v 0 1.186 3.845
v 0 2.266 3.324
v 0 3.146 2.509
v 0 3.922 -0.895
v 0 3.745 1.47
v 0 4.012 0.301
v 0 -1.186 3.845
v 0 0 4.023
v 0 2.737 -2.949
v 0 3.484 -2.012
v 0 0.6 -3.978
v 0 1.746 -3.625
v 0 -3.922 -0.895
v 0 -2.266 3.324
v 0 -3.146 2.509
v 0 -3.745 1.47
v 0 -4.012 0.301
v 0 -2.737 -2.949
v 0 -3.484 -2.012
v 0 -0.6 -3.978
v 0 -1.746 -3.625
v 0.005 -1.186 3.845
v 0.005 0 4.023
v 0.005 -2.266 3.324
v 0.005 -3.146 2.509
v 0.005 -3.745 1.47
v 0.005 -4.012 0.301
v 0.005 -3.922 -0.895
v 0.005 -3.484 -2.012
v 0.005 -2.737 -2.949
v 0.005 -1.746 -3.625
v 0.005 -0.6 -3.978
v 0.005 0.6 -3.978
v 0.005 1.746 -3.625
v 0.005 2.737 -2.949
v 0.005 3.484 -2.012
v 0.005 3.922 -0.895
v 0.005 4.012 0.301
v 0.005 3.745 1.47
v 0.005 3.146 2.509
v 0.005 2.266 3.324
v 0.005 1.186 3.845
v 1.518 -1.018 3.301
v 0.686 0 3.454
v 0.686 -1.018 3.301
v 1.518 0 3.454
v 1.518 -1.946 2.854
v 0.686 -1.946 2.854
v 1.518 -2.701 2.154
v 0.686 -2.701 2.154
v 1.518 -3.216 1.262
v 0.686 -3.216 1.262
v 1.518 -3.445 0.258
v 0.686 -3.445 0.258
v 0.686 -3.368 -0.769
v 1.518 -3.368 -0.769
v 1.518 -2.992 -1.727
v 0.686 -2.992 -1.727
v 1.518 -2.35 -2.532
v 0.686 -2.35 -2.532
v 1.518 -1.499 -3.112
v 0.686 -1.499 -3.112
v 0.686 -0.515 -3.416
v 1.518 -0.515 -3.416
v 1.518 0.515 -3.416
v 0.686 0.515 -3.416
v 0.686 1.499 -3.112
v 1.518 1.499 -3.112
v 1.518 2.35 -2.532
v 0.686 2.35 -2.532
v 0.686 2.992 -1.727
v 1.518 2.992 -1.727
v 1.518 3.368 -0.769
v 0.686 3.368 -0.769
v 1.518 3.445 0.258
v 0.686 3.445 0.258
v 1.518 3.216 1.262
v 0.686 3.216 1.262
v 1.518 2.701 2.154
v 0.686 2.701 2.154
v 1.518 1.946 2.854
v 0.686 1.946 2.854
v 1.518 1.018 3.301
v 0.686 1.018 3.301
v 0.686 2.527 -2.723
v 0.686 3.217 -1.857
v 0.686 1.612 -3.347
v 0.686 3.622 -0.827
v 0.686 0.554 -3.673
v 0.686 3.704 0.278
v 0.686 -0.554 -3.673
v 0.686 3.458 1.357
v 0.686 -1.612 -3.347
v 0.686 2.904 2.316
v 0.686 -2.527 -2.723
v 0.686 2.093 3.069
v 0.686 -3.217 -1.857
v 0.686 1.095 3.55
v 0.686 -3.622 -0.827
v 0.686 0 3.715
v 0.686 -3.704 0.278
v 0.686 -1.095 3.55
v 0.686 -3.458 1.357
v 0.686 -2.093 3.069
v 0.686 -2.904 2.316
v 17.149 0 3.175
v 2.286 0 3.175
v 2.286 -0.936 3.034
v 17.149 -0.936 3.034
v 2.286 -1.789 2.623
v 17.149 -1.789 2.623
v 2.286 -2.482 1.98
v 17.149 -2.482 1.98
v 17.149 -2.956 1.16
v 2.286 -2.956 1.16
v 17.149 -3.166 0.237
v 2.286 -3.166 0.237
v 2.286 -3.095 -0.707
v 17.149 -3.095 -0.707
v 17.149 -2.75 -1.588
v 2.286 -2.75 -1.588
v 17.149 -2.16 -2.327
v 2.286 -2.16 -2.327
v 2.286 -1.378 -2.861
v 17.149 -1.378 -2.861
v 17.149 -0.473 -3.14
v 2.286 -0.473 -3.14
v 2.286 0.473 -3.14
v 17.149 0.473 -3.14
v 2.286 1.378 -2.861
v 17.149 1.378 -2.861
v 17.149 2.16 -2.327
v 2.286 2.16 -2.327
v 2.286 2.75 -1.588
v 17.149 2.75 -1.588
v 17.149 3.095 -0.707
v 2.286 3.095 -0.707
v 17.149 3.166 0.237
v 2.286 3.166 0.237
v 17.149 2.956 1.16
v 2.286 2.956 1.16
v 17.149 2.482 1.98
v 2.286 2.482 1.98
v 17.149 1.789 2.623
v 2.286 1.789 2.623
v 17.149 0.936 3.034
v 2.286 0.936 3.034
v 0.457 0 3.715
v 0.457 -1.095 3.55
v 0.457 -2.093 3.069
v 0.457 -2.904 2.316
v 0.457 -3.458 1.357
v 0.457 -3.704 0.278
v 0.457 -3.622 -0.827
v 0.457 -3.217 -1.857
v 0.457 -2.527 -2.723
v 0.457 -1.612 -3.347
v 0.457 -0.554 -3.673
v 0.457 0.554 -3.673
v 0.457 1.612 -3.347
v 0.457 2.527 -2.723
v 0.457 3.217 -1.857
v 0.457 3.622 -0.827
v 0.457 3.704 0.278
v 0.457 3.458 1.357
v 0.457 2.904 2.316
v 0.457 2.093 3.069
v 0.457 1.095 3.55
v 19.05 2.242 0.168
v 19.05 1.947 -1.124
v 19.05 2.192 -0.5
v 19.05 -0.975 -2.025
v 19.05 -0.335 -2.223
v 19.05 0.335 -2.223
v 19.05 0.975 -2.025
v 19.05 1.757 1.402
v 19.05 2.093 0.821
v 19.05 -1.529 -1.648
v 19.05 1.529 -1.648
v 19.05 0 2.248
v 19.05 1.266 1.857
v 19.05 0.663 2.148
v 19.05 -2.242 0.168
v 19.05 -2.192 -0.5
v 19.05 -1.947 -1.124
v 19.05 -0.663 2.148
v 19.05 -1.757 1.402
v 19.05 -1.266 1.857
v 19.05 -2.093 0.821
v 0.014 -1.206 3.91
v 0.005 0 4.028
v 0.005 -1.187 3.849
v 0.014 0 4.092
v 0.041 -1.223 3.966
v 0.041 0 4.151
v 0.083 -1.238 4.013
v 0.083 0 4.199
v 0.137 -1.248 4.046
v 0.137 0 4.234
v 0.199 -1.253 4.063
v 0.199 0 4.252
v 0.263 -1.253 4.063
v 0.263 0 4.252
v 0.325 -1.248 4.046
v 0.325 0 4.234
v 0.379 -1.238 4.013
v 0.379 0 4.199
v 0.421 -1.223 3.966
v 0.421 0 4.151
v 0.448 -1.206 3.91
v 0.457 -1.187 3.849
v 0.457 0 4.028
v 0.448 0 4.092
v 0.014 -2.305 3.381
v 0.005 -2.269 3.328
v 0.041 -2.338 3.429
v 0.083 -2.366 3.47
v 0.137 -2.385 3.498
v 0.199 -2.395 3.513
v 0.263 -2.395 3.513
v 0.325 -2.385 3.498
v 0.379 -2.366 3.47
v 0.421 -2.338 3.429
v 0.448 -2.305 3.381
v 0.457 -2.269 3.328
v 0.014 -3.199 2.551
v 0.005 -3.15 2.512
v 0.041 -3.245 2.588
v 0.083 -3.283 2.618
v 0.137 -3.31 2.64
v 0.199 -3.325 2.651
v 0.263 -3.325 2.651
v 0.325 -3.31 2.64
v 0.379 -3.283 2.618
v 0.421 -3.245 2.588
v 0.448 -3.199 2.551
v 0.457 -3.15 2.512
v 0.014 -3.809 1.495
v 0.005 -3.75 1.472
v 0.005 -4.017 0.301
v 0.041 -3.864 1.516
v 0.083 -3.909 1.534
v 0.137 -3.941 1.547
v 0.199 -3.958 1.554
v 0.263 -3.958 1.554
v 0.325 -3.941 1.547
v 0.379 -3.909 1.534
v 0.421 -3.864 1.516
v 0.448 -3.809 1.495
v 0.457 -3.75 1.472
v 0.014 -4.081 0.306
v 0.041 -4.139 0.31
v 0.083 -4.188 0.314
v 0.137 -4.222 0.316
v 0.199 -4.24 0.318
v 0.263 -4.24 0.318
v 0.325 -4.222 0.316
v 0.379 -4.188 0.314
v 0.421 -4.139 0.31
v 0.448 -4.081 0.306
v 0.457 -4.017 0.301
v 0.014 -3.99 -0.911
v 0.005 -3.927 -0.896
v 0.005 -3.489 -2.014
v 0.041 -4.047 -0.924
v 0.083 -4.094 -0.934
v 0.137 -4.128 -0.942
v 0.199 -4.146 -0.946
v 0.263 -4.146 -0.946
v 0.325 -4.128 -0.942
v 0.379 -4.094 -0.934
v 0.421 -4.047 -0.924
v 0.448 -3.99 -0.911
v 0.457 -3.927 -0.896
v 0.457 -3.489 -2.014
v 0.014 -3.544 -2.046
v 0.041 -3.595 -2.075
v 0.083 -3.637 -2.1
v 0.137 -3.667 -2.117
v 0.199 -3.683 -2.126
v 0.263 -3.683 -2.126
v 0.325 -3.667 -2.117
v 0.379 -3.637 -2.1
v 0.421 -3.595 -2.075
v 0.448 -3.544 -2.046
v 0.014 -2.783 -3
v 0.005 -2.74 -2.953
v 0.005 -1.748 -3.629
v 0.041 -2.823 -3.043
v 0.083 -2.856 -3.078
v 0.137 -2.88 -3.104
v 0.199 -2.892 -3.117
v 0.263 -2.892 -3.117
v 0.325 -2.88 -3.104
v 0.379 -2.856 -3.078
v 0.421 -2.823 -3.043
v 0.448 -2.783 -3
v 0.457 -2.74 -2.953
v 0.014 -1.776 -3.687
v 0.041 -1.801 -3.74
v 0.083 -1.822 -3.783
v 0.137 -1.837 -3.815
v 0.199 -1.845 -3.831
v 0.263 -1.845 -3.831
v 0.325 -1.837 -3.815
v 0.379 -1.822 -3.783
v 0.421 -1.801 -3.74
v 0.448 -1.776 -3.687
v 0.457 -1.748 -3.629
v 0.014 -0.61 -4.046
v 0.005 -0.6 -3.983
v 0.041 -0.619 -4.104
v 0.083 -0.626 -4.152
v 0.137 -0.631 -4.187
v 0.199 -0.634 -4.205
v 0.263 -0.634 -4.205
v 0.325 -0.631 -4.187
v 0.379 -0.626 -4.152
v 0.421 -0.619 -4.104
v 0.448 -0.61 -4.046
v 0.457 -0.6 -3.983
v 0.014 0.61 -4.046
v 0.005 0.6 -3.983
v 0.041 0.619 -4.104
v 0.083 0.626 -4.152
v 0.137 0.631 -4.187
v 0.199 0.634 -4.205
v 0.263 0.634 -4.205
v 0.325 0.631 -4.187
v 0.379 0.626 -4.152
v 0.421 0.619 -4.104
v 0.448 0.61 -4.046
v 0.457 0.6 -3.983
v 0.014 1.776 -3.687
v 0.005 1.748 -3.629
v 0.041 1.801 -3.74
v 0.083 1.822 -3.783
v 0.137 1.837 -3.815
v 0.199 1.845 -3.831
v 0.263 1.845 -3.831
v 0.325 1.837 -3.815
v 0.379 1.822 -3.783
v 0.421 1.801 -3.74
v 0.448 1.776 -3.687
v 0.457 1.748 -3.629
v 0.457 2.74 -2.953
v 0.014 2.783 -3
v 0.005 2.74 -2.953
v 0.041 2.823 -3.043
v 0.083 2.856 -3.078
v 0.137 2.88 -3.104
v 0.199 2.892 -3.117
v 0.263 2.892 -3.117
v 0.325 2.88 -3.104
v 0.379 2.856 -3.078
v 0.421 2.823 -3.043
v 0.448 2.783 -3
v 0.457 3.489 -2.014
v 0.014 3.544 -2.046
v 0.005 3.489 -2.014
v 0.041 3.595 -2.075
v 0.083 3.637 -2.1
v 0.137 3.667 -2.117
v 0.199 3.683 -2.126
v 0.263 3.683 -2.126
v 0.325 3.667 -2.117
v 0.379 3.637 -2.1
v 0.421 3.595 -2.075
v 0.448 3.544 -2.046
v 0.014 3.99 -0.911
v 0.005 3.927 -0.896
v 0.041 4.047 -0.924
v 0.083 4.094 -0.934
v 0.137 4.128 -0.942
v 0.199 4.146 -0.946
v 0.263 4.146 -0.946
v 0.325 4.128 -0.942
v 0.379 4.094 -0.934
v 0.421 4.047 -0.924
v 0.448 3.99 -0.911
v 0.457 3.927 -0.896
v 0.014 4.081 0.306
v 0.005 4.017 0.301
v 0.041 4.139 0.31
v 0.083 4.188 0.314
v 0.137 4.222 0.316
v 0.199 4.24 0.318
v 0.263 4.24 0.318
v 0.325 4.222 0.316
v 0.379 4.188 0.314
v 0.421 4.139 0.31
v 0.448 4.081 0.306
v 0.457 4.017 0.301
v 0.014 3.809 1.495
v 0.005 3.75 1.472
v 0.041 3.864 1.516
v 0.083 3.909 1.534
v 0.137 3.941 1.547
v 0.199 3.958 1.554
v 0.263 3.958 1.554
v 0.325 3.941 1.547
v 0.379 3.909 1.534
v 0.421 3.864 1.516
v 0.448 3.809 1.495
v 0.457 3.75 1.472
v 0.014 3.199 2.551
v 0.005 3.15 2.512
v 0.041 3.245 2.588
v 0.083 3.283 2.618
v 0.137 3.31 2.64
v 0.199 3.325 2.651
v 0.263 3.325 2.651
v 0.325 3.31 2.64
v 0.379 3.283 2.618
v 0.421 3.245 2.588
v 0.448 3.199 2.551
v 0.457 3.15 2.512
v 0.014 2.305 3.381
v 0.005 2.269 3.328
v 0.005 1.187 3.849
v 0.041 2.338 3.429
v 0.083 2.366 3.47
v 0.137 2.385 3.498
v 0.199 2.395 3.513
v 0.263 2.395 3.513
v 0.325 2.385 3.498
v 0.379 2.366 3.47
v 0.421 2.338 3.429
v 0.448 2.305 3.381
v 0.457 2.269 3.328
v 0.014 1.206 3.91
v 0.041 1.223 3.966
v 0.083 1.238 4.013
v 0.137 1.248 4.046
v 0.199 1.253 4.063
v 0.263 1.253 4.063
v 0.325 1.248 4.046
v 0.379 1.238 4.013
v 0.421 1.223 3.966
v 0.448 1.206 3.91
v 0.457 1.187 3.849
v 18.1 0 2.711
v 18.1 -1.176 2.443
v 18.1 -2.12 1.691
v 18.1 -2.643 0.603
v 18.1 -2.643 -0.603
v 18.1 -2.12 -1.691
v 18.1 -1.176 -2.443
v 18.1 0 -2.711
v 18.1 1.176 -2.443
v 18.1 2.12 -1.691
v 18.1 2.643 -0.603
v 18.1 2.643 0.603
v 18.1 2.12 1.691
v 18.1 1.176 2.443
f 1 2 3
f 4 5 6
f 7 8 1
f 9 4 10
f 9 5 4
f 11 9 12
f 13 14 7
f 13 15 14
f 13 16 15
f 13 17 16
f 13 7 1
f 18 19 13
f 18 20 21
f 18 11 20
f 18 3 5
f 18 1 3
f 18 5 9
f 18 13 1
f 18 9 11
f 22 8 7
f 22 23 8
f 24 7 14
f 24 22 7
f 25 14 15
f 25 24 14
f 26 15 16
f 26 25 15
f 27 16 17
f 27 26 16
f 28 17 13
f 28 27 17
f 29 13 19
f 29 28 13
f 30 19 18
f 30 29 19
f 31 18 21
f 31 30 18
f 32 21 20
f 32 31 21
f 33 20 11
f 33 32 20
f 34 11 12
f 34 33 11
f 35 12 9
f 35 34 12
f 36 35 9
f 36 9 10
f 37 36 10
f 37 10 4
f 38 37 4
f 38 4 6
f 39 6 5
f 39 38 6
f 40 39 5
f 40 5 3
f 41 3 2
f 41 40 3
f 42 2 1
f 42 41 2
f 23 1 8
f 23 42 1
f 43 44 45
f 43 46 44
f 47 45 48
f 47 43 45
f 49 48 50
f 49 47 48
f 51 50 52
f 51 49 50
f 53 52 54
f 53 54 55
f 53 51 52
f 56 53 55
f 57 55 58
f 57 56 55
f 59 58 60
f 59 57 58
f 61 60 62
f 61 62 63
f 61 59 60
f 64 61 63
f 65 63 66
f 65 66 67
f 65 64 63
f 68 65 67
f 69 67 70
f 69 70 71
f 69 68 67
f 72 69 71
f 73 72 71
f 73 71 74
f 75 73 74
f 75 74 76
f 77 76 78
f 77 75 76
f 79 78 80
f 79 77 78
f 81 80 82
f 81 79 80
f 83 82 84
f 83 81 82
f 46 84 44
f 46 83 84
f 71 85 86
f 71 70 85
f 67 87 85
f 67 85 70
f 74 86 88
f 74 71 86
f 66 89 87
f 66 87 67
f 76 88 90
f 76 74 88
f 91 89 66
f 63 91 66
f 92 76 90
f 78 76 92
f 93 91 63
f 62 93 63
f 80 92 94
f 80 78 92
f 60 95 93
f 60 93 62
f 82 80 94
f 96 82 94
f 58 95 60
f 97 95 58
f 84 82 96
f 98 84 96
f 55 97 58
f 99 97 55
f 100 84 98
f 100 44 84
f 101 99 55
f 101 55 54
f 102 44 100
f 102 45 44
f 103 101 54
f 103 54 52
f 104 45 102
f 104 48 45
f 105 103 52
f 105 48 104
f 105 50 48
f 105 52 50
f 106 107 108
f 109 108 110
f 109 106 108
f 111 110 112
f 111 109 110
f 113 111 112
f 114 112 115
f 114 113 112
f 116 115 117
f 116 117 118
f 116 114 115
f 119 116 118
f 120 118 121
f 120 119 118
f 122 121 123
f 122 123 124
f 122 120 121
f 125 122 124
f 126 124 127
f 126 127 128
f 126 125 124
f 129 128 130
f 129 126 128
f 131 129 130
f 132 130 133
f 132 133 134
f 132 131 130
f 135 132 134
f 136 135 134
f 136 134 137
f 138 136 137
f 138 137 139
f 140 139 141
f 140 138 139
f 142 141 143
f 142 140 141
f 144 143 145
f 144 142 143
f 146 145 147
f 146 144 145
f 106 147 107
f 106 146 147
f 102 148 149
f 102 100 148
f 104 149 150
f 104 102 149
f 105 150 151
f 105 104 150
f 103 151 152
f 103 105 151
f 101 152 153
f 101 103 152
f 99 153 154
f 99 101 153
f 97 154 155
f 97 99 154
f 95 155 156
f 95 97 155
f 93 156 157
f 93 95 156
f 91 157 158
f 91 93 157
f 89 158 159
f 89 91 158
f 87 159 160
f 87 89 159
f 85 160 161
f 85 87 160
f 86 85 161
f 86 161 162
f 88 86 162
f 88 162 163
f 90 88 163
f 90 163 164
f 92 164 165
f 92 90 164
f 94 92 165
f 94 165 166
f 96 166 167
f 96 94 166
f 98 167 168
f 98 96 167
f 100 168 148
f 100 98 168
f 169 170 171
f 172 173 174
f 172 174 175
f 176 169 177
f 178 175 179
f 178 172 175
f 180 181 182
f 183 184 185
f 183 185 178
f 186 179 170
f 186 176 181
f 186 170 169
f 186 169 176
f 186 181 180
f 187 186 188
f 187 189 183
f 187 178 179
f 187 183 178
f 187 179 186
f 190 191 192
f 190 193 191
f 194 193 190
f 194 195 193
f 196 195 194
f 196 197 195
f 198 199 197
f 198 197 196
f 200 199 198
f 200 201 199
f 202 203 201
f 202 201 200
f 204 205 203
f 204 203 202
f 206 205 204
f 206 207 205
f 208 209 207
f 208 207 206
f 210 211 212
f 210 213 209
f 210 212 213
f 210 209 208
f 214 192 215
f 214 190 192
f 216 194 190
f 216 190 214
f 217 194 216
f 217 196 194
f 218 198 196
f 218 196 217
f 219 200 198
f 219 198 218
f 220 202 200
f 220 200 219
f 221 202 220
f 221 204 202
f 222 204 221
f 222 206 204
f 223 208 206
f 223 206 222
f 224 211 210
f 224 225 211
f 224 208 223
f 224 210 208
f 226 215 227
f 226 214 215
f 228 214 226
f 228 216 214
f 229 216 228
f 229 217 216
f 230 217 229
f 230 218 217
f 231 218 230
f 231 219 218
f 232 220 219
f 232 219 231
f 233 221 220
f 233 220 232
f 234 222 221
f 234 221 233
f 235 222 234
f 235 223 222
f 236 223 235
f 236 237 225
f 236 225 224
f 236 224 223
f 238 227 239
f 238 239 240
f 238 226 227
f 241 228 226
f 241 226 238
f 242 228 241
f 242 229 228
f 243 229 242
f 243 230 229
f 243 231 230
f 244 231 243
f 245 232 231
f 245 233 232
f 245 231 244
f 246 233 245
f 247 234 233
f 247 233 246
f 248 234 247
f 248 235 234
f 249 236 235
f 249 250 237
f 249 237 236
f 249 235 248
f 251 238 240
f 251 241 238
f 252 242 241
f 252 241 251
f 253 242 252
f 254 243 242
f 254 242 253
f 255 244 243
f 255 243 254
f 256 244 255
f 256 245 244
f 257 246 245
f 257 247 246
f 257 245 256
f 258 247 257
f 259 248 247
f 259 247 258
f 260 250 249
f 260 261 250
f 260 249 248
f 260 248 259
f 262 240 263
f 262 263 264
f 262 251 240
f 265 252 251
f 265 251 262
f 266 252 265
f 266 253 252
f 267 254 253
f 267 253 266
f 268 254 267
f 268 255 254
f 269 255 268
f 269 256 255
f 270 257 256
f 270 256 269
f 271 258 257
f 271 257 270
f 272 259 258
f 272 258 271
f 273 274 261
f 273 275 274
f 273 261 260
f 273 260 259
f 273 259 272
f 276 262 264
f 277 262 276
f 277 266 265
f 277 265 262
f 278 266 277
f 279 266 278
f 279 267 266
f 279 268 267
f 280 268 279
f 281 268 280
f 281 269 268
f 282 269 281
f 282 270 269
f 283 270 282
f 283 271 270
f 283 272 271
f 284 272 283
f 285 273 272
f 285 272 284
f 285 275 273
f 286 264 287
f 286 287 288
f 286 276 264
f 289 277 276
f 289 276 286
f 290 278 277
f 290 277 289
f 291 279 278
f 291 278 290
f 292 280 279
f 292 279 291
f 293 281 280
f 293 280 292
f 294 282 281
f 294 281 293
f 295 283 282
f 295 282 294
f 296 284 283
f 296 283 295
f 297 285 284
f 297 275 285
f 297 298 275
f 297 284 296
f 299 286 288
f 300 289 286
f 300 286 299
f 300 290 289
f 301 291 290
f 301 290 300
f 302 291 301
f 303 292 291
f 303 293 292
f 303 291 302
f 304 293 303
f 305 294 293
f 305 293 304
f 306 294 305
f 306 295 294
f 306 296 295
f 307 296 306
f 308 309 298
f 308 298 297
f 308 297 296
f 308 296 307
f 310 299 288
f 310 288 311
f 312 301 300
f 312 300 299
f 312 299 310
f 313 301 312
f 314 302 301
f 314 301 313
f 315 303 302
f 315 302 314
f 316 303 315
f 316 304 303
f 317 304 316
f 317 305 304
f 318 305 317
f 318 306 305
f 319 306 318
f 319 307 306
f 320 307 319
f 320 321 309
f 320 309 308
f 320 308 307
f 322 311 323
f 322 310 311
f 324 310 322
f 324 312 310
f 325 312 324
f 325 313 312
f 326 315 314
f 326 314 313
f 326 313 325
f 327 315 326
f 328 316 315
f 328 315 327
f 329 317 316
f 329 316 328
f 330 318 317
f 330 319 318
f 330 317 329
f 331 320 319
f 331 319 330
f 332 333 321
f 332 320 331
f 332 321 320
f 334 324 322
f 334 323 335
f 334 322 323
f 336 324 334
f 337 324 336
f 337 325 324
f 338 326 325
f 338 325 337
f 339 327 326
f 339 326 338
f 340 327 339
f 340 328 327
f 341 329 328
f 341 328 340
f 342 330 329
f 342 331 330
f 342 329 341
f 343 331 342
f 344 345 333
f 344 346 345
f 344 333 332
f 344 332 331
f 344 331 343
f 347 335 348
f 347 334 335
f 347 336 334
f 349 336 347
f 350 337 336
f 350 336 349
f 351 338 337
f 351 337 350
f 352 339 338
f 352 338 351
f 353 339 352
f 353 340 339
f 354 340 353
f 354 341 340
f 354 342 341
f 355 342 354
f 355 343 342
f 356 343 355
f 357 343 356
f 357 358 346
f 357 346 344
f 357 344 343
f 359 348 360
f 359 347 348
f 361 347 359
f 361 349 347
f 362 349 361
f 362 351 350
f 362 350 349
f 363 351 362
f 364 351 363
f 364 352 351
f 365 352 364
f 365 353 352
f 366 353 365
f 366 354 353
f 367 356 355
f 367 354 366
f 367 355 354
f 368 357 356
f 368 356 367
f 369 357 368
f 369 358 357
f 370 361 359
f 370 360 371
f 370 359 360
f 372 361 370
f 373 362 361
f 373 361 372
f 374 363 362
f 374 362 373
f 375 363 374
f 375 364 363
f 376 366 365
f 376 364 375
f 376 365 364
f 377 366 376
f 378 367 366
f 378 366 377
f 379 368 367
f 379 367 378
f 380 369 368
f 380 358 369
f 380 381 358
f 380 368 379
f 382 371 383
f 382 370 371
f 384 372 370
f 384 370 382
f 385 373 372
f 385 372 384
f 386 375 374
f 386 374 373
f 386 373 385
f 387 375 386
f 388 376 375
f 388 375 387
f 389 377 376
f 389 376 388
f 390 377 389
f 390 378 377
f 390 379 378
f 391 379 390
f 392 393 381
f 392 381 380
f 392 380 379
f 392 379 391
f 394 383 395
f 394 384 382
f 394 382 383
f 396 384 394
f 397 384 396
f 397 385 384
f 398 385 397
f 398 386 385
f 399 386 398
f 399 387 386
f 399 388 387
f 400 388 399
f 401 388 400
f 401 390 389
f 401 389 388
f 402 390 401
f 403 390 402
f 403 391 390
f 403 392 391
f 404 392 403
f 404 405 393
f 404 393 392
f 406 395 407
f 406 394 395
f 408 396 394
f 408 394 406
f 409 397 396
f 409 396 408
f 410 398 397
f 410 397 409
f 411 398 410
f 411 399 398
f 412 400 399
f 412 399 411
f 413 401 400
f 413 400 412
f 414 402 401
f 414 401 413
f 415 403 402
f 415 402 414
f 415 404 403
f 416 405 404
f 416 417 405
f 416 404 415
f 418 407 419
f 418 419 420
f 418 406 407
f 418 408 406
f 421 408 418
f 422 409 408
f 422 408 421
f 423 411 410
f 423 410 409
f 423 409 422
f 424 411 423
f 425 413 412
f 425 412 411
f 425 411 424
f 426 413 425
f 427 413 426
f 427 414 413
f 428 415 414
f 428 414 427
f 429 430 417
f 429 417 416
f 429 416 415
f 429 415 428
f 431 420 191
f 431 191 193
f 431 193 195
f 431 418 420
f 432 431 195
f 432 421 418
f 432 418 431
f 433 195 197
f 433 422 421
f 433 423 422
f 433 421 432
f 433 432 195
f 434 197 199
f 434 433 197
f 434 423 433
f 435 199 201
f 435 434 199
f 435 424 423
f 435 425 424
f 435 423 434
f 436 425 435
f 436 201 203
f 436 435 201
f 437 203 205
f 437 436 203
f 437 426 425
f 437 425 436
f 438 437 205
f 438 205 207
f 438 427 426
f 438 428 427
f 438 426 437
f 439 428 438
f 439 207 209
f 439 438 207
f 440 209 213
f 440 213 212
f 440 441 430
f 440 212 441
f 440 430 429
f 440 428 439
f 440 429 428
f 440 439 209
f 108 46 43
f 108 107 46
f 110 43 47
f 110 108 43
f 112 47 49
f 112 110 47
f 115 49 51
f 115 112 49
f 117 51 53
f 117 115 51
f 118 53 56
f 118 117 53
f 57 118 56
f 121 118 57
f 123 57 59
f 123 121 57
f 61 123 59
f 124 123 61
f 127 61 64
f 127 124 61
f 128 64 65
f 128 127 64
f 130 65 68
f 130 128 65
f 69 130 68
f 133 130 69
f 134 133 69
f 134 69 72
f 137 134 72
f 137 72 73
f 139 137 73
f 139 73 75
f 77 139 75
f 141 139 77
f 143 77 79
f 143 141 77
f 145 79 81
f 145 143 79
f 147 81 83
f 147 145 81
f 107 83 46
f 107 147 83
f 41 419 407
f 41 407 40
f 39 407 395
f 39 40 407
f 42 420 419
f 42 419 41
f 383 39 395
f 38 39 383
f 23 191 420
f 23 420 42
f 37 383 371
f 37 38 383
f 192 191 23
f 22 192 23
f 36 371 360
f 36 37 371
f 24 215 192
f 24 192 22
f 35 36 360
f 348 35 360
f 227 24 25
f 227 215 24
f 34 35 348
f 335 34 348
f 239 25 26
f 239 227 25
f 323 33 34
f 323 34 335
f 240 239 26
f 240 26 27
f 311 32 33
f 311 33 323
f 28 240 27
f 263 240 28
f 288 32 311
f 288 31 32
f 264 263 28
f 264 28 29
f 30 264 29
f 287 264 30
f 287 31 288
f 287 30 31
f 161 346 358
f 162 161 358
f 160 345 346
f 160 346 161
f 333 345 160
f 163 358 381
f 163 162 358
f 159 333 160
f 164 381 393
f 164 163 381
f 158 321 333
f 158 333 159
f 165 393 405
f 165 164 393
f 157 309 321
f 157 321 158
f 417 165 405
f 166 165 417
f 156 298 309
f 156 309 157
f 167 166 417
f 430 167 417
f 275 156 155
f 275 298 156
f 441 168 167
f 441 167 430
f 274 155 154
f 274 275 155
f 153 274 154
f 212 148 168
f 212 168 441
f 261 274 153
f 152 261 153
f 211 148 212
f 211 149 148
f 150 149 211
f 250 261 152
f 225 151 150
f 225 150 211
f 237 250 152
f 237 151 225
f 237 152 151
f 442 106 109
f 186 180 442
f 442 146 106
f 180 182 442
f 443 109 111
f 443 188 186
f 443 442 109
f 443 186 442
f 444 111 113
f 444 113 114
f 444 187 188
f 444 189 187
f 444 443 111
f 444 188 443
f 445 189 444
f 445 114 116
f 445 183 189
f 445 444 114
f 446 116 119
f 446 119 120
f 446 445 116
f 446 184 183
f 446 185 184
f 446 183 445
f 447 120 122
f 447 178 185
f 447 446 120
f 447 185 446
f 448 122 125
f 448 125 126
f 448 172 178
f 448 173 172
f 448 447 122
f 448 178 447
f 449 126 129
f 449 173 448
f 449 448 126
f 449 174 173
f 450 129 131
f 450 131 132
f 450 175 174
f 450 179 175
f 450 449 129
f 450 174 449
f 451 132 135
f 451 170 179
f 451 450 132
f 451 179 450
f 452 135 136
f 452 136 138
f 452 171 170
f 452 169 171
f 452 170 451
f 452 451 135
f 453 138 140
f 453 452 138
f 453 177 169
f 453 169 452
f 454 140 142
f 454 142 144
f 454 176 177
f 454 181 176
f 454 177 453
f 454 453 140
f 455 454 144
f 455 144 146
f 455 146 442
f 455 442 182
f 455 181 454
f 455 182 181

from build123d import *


with BuildPart() as part:
    # BodySke → BaseBody (revolve)
    with BuildSketch(Plane.XY, mode=Mode.PRIVATE) as basebody_sk:
        with BuildLine():
            Line((0, 0), (0, 4.02336))
            Line((0, 4.02336), (0.00508, 4.02336))
            Line((0.00508, 4.02336), (0.00508, 4.02844))
            ThreePointArc((0.00508, 4.02844), (0.23114, 4.2545), (0.4572, 4.02844))
            Line((0.4572, 4.02844), (0.4572, 3.71475))
            Line((0.4572, 3.71475), (0.6858, 3.71475))
            Line((0.6858, 3.71475), (0.6858, 3.4544))
            Line((0.6858, 3.4544), (1.518354809, 3.4544))
            Line((1.518354809, 3.4544), (2.286, 3.175))
            Line((2.286, 3.175), (17.149163308, 3.175))
            Line((17.149163308, 3.175), (19.05, 2.2479))
            Line((19.05, 2.2479), (19.05, 0))
            Line((19.05, 0), (0, 0))
        make_face()
    revolve(basebody_sk.sketch.rotate(Axis((0, 0, 0), (1, 0, 0)), 90), axis=Axis((0, 0, 0), (1, 0, 0)))


solid = part.part
